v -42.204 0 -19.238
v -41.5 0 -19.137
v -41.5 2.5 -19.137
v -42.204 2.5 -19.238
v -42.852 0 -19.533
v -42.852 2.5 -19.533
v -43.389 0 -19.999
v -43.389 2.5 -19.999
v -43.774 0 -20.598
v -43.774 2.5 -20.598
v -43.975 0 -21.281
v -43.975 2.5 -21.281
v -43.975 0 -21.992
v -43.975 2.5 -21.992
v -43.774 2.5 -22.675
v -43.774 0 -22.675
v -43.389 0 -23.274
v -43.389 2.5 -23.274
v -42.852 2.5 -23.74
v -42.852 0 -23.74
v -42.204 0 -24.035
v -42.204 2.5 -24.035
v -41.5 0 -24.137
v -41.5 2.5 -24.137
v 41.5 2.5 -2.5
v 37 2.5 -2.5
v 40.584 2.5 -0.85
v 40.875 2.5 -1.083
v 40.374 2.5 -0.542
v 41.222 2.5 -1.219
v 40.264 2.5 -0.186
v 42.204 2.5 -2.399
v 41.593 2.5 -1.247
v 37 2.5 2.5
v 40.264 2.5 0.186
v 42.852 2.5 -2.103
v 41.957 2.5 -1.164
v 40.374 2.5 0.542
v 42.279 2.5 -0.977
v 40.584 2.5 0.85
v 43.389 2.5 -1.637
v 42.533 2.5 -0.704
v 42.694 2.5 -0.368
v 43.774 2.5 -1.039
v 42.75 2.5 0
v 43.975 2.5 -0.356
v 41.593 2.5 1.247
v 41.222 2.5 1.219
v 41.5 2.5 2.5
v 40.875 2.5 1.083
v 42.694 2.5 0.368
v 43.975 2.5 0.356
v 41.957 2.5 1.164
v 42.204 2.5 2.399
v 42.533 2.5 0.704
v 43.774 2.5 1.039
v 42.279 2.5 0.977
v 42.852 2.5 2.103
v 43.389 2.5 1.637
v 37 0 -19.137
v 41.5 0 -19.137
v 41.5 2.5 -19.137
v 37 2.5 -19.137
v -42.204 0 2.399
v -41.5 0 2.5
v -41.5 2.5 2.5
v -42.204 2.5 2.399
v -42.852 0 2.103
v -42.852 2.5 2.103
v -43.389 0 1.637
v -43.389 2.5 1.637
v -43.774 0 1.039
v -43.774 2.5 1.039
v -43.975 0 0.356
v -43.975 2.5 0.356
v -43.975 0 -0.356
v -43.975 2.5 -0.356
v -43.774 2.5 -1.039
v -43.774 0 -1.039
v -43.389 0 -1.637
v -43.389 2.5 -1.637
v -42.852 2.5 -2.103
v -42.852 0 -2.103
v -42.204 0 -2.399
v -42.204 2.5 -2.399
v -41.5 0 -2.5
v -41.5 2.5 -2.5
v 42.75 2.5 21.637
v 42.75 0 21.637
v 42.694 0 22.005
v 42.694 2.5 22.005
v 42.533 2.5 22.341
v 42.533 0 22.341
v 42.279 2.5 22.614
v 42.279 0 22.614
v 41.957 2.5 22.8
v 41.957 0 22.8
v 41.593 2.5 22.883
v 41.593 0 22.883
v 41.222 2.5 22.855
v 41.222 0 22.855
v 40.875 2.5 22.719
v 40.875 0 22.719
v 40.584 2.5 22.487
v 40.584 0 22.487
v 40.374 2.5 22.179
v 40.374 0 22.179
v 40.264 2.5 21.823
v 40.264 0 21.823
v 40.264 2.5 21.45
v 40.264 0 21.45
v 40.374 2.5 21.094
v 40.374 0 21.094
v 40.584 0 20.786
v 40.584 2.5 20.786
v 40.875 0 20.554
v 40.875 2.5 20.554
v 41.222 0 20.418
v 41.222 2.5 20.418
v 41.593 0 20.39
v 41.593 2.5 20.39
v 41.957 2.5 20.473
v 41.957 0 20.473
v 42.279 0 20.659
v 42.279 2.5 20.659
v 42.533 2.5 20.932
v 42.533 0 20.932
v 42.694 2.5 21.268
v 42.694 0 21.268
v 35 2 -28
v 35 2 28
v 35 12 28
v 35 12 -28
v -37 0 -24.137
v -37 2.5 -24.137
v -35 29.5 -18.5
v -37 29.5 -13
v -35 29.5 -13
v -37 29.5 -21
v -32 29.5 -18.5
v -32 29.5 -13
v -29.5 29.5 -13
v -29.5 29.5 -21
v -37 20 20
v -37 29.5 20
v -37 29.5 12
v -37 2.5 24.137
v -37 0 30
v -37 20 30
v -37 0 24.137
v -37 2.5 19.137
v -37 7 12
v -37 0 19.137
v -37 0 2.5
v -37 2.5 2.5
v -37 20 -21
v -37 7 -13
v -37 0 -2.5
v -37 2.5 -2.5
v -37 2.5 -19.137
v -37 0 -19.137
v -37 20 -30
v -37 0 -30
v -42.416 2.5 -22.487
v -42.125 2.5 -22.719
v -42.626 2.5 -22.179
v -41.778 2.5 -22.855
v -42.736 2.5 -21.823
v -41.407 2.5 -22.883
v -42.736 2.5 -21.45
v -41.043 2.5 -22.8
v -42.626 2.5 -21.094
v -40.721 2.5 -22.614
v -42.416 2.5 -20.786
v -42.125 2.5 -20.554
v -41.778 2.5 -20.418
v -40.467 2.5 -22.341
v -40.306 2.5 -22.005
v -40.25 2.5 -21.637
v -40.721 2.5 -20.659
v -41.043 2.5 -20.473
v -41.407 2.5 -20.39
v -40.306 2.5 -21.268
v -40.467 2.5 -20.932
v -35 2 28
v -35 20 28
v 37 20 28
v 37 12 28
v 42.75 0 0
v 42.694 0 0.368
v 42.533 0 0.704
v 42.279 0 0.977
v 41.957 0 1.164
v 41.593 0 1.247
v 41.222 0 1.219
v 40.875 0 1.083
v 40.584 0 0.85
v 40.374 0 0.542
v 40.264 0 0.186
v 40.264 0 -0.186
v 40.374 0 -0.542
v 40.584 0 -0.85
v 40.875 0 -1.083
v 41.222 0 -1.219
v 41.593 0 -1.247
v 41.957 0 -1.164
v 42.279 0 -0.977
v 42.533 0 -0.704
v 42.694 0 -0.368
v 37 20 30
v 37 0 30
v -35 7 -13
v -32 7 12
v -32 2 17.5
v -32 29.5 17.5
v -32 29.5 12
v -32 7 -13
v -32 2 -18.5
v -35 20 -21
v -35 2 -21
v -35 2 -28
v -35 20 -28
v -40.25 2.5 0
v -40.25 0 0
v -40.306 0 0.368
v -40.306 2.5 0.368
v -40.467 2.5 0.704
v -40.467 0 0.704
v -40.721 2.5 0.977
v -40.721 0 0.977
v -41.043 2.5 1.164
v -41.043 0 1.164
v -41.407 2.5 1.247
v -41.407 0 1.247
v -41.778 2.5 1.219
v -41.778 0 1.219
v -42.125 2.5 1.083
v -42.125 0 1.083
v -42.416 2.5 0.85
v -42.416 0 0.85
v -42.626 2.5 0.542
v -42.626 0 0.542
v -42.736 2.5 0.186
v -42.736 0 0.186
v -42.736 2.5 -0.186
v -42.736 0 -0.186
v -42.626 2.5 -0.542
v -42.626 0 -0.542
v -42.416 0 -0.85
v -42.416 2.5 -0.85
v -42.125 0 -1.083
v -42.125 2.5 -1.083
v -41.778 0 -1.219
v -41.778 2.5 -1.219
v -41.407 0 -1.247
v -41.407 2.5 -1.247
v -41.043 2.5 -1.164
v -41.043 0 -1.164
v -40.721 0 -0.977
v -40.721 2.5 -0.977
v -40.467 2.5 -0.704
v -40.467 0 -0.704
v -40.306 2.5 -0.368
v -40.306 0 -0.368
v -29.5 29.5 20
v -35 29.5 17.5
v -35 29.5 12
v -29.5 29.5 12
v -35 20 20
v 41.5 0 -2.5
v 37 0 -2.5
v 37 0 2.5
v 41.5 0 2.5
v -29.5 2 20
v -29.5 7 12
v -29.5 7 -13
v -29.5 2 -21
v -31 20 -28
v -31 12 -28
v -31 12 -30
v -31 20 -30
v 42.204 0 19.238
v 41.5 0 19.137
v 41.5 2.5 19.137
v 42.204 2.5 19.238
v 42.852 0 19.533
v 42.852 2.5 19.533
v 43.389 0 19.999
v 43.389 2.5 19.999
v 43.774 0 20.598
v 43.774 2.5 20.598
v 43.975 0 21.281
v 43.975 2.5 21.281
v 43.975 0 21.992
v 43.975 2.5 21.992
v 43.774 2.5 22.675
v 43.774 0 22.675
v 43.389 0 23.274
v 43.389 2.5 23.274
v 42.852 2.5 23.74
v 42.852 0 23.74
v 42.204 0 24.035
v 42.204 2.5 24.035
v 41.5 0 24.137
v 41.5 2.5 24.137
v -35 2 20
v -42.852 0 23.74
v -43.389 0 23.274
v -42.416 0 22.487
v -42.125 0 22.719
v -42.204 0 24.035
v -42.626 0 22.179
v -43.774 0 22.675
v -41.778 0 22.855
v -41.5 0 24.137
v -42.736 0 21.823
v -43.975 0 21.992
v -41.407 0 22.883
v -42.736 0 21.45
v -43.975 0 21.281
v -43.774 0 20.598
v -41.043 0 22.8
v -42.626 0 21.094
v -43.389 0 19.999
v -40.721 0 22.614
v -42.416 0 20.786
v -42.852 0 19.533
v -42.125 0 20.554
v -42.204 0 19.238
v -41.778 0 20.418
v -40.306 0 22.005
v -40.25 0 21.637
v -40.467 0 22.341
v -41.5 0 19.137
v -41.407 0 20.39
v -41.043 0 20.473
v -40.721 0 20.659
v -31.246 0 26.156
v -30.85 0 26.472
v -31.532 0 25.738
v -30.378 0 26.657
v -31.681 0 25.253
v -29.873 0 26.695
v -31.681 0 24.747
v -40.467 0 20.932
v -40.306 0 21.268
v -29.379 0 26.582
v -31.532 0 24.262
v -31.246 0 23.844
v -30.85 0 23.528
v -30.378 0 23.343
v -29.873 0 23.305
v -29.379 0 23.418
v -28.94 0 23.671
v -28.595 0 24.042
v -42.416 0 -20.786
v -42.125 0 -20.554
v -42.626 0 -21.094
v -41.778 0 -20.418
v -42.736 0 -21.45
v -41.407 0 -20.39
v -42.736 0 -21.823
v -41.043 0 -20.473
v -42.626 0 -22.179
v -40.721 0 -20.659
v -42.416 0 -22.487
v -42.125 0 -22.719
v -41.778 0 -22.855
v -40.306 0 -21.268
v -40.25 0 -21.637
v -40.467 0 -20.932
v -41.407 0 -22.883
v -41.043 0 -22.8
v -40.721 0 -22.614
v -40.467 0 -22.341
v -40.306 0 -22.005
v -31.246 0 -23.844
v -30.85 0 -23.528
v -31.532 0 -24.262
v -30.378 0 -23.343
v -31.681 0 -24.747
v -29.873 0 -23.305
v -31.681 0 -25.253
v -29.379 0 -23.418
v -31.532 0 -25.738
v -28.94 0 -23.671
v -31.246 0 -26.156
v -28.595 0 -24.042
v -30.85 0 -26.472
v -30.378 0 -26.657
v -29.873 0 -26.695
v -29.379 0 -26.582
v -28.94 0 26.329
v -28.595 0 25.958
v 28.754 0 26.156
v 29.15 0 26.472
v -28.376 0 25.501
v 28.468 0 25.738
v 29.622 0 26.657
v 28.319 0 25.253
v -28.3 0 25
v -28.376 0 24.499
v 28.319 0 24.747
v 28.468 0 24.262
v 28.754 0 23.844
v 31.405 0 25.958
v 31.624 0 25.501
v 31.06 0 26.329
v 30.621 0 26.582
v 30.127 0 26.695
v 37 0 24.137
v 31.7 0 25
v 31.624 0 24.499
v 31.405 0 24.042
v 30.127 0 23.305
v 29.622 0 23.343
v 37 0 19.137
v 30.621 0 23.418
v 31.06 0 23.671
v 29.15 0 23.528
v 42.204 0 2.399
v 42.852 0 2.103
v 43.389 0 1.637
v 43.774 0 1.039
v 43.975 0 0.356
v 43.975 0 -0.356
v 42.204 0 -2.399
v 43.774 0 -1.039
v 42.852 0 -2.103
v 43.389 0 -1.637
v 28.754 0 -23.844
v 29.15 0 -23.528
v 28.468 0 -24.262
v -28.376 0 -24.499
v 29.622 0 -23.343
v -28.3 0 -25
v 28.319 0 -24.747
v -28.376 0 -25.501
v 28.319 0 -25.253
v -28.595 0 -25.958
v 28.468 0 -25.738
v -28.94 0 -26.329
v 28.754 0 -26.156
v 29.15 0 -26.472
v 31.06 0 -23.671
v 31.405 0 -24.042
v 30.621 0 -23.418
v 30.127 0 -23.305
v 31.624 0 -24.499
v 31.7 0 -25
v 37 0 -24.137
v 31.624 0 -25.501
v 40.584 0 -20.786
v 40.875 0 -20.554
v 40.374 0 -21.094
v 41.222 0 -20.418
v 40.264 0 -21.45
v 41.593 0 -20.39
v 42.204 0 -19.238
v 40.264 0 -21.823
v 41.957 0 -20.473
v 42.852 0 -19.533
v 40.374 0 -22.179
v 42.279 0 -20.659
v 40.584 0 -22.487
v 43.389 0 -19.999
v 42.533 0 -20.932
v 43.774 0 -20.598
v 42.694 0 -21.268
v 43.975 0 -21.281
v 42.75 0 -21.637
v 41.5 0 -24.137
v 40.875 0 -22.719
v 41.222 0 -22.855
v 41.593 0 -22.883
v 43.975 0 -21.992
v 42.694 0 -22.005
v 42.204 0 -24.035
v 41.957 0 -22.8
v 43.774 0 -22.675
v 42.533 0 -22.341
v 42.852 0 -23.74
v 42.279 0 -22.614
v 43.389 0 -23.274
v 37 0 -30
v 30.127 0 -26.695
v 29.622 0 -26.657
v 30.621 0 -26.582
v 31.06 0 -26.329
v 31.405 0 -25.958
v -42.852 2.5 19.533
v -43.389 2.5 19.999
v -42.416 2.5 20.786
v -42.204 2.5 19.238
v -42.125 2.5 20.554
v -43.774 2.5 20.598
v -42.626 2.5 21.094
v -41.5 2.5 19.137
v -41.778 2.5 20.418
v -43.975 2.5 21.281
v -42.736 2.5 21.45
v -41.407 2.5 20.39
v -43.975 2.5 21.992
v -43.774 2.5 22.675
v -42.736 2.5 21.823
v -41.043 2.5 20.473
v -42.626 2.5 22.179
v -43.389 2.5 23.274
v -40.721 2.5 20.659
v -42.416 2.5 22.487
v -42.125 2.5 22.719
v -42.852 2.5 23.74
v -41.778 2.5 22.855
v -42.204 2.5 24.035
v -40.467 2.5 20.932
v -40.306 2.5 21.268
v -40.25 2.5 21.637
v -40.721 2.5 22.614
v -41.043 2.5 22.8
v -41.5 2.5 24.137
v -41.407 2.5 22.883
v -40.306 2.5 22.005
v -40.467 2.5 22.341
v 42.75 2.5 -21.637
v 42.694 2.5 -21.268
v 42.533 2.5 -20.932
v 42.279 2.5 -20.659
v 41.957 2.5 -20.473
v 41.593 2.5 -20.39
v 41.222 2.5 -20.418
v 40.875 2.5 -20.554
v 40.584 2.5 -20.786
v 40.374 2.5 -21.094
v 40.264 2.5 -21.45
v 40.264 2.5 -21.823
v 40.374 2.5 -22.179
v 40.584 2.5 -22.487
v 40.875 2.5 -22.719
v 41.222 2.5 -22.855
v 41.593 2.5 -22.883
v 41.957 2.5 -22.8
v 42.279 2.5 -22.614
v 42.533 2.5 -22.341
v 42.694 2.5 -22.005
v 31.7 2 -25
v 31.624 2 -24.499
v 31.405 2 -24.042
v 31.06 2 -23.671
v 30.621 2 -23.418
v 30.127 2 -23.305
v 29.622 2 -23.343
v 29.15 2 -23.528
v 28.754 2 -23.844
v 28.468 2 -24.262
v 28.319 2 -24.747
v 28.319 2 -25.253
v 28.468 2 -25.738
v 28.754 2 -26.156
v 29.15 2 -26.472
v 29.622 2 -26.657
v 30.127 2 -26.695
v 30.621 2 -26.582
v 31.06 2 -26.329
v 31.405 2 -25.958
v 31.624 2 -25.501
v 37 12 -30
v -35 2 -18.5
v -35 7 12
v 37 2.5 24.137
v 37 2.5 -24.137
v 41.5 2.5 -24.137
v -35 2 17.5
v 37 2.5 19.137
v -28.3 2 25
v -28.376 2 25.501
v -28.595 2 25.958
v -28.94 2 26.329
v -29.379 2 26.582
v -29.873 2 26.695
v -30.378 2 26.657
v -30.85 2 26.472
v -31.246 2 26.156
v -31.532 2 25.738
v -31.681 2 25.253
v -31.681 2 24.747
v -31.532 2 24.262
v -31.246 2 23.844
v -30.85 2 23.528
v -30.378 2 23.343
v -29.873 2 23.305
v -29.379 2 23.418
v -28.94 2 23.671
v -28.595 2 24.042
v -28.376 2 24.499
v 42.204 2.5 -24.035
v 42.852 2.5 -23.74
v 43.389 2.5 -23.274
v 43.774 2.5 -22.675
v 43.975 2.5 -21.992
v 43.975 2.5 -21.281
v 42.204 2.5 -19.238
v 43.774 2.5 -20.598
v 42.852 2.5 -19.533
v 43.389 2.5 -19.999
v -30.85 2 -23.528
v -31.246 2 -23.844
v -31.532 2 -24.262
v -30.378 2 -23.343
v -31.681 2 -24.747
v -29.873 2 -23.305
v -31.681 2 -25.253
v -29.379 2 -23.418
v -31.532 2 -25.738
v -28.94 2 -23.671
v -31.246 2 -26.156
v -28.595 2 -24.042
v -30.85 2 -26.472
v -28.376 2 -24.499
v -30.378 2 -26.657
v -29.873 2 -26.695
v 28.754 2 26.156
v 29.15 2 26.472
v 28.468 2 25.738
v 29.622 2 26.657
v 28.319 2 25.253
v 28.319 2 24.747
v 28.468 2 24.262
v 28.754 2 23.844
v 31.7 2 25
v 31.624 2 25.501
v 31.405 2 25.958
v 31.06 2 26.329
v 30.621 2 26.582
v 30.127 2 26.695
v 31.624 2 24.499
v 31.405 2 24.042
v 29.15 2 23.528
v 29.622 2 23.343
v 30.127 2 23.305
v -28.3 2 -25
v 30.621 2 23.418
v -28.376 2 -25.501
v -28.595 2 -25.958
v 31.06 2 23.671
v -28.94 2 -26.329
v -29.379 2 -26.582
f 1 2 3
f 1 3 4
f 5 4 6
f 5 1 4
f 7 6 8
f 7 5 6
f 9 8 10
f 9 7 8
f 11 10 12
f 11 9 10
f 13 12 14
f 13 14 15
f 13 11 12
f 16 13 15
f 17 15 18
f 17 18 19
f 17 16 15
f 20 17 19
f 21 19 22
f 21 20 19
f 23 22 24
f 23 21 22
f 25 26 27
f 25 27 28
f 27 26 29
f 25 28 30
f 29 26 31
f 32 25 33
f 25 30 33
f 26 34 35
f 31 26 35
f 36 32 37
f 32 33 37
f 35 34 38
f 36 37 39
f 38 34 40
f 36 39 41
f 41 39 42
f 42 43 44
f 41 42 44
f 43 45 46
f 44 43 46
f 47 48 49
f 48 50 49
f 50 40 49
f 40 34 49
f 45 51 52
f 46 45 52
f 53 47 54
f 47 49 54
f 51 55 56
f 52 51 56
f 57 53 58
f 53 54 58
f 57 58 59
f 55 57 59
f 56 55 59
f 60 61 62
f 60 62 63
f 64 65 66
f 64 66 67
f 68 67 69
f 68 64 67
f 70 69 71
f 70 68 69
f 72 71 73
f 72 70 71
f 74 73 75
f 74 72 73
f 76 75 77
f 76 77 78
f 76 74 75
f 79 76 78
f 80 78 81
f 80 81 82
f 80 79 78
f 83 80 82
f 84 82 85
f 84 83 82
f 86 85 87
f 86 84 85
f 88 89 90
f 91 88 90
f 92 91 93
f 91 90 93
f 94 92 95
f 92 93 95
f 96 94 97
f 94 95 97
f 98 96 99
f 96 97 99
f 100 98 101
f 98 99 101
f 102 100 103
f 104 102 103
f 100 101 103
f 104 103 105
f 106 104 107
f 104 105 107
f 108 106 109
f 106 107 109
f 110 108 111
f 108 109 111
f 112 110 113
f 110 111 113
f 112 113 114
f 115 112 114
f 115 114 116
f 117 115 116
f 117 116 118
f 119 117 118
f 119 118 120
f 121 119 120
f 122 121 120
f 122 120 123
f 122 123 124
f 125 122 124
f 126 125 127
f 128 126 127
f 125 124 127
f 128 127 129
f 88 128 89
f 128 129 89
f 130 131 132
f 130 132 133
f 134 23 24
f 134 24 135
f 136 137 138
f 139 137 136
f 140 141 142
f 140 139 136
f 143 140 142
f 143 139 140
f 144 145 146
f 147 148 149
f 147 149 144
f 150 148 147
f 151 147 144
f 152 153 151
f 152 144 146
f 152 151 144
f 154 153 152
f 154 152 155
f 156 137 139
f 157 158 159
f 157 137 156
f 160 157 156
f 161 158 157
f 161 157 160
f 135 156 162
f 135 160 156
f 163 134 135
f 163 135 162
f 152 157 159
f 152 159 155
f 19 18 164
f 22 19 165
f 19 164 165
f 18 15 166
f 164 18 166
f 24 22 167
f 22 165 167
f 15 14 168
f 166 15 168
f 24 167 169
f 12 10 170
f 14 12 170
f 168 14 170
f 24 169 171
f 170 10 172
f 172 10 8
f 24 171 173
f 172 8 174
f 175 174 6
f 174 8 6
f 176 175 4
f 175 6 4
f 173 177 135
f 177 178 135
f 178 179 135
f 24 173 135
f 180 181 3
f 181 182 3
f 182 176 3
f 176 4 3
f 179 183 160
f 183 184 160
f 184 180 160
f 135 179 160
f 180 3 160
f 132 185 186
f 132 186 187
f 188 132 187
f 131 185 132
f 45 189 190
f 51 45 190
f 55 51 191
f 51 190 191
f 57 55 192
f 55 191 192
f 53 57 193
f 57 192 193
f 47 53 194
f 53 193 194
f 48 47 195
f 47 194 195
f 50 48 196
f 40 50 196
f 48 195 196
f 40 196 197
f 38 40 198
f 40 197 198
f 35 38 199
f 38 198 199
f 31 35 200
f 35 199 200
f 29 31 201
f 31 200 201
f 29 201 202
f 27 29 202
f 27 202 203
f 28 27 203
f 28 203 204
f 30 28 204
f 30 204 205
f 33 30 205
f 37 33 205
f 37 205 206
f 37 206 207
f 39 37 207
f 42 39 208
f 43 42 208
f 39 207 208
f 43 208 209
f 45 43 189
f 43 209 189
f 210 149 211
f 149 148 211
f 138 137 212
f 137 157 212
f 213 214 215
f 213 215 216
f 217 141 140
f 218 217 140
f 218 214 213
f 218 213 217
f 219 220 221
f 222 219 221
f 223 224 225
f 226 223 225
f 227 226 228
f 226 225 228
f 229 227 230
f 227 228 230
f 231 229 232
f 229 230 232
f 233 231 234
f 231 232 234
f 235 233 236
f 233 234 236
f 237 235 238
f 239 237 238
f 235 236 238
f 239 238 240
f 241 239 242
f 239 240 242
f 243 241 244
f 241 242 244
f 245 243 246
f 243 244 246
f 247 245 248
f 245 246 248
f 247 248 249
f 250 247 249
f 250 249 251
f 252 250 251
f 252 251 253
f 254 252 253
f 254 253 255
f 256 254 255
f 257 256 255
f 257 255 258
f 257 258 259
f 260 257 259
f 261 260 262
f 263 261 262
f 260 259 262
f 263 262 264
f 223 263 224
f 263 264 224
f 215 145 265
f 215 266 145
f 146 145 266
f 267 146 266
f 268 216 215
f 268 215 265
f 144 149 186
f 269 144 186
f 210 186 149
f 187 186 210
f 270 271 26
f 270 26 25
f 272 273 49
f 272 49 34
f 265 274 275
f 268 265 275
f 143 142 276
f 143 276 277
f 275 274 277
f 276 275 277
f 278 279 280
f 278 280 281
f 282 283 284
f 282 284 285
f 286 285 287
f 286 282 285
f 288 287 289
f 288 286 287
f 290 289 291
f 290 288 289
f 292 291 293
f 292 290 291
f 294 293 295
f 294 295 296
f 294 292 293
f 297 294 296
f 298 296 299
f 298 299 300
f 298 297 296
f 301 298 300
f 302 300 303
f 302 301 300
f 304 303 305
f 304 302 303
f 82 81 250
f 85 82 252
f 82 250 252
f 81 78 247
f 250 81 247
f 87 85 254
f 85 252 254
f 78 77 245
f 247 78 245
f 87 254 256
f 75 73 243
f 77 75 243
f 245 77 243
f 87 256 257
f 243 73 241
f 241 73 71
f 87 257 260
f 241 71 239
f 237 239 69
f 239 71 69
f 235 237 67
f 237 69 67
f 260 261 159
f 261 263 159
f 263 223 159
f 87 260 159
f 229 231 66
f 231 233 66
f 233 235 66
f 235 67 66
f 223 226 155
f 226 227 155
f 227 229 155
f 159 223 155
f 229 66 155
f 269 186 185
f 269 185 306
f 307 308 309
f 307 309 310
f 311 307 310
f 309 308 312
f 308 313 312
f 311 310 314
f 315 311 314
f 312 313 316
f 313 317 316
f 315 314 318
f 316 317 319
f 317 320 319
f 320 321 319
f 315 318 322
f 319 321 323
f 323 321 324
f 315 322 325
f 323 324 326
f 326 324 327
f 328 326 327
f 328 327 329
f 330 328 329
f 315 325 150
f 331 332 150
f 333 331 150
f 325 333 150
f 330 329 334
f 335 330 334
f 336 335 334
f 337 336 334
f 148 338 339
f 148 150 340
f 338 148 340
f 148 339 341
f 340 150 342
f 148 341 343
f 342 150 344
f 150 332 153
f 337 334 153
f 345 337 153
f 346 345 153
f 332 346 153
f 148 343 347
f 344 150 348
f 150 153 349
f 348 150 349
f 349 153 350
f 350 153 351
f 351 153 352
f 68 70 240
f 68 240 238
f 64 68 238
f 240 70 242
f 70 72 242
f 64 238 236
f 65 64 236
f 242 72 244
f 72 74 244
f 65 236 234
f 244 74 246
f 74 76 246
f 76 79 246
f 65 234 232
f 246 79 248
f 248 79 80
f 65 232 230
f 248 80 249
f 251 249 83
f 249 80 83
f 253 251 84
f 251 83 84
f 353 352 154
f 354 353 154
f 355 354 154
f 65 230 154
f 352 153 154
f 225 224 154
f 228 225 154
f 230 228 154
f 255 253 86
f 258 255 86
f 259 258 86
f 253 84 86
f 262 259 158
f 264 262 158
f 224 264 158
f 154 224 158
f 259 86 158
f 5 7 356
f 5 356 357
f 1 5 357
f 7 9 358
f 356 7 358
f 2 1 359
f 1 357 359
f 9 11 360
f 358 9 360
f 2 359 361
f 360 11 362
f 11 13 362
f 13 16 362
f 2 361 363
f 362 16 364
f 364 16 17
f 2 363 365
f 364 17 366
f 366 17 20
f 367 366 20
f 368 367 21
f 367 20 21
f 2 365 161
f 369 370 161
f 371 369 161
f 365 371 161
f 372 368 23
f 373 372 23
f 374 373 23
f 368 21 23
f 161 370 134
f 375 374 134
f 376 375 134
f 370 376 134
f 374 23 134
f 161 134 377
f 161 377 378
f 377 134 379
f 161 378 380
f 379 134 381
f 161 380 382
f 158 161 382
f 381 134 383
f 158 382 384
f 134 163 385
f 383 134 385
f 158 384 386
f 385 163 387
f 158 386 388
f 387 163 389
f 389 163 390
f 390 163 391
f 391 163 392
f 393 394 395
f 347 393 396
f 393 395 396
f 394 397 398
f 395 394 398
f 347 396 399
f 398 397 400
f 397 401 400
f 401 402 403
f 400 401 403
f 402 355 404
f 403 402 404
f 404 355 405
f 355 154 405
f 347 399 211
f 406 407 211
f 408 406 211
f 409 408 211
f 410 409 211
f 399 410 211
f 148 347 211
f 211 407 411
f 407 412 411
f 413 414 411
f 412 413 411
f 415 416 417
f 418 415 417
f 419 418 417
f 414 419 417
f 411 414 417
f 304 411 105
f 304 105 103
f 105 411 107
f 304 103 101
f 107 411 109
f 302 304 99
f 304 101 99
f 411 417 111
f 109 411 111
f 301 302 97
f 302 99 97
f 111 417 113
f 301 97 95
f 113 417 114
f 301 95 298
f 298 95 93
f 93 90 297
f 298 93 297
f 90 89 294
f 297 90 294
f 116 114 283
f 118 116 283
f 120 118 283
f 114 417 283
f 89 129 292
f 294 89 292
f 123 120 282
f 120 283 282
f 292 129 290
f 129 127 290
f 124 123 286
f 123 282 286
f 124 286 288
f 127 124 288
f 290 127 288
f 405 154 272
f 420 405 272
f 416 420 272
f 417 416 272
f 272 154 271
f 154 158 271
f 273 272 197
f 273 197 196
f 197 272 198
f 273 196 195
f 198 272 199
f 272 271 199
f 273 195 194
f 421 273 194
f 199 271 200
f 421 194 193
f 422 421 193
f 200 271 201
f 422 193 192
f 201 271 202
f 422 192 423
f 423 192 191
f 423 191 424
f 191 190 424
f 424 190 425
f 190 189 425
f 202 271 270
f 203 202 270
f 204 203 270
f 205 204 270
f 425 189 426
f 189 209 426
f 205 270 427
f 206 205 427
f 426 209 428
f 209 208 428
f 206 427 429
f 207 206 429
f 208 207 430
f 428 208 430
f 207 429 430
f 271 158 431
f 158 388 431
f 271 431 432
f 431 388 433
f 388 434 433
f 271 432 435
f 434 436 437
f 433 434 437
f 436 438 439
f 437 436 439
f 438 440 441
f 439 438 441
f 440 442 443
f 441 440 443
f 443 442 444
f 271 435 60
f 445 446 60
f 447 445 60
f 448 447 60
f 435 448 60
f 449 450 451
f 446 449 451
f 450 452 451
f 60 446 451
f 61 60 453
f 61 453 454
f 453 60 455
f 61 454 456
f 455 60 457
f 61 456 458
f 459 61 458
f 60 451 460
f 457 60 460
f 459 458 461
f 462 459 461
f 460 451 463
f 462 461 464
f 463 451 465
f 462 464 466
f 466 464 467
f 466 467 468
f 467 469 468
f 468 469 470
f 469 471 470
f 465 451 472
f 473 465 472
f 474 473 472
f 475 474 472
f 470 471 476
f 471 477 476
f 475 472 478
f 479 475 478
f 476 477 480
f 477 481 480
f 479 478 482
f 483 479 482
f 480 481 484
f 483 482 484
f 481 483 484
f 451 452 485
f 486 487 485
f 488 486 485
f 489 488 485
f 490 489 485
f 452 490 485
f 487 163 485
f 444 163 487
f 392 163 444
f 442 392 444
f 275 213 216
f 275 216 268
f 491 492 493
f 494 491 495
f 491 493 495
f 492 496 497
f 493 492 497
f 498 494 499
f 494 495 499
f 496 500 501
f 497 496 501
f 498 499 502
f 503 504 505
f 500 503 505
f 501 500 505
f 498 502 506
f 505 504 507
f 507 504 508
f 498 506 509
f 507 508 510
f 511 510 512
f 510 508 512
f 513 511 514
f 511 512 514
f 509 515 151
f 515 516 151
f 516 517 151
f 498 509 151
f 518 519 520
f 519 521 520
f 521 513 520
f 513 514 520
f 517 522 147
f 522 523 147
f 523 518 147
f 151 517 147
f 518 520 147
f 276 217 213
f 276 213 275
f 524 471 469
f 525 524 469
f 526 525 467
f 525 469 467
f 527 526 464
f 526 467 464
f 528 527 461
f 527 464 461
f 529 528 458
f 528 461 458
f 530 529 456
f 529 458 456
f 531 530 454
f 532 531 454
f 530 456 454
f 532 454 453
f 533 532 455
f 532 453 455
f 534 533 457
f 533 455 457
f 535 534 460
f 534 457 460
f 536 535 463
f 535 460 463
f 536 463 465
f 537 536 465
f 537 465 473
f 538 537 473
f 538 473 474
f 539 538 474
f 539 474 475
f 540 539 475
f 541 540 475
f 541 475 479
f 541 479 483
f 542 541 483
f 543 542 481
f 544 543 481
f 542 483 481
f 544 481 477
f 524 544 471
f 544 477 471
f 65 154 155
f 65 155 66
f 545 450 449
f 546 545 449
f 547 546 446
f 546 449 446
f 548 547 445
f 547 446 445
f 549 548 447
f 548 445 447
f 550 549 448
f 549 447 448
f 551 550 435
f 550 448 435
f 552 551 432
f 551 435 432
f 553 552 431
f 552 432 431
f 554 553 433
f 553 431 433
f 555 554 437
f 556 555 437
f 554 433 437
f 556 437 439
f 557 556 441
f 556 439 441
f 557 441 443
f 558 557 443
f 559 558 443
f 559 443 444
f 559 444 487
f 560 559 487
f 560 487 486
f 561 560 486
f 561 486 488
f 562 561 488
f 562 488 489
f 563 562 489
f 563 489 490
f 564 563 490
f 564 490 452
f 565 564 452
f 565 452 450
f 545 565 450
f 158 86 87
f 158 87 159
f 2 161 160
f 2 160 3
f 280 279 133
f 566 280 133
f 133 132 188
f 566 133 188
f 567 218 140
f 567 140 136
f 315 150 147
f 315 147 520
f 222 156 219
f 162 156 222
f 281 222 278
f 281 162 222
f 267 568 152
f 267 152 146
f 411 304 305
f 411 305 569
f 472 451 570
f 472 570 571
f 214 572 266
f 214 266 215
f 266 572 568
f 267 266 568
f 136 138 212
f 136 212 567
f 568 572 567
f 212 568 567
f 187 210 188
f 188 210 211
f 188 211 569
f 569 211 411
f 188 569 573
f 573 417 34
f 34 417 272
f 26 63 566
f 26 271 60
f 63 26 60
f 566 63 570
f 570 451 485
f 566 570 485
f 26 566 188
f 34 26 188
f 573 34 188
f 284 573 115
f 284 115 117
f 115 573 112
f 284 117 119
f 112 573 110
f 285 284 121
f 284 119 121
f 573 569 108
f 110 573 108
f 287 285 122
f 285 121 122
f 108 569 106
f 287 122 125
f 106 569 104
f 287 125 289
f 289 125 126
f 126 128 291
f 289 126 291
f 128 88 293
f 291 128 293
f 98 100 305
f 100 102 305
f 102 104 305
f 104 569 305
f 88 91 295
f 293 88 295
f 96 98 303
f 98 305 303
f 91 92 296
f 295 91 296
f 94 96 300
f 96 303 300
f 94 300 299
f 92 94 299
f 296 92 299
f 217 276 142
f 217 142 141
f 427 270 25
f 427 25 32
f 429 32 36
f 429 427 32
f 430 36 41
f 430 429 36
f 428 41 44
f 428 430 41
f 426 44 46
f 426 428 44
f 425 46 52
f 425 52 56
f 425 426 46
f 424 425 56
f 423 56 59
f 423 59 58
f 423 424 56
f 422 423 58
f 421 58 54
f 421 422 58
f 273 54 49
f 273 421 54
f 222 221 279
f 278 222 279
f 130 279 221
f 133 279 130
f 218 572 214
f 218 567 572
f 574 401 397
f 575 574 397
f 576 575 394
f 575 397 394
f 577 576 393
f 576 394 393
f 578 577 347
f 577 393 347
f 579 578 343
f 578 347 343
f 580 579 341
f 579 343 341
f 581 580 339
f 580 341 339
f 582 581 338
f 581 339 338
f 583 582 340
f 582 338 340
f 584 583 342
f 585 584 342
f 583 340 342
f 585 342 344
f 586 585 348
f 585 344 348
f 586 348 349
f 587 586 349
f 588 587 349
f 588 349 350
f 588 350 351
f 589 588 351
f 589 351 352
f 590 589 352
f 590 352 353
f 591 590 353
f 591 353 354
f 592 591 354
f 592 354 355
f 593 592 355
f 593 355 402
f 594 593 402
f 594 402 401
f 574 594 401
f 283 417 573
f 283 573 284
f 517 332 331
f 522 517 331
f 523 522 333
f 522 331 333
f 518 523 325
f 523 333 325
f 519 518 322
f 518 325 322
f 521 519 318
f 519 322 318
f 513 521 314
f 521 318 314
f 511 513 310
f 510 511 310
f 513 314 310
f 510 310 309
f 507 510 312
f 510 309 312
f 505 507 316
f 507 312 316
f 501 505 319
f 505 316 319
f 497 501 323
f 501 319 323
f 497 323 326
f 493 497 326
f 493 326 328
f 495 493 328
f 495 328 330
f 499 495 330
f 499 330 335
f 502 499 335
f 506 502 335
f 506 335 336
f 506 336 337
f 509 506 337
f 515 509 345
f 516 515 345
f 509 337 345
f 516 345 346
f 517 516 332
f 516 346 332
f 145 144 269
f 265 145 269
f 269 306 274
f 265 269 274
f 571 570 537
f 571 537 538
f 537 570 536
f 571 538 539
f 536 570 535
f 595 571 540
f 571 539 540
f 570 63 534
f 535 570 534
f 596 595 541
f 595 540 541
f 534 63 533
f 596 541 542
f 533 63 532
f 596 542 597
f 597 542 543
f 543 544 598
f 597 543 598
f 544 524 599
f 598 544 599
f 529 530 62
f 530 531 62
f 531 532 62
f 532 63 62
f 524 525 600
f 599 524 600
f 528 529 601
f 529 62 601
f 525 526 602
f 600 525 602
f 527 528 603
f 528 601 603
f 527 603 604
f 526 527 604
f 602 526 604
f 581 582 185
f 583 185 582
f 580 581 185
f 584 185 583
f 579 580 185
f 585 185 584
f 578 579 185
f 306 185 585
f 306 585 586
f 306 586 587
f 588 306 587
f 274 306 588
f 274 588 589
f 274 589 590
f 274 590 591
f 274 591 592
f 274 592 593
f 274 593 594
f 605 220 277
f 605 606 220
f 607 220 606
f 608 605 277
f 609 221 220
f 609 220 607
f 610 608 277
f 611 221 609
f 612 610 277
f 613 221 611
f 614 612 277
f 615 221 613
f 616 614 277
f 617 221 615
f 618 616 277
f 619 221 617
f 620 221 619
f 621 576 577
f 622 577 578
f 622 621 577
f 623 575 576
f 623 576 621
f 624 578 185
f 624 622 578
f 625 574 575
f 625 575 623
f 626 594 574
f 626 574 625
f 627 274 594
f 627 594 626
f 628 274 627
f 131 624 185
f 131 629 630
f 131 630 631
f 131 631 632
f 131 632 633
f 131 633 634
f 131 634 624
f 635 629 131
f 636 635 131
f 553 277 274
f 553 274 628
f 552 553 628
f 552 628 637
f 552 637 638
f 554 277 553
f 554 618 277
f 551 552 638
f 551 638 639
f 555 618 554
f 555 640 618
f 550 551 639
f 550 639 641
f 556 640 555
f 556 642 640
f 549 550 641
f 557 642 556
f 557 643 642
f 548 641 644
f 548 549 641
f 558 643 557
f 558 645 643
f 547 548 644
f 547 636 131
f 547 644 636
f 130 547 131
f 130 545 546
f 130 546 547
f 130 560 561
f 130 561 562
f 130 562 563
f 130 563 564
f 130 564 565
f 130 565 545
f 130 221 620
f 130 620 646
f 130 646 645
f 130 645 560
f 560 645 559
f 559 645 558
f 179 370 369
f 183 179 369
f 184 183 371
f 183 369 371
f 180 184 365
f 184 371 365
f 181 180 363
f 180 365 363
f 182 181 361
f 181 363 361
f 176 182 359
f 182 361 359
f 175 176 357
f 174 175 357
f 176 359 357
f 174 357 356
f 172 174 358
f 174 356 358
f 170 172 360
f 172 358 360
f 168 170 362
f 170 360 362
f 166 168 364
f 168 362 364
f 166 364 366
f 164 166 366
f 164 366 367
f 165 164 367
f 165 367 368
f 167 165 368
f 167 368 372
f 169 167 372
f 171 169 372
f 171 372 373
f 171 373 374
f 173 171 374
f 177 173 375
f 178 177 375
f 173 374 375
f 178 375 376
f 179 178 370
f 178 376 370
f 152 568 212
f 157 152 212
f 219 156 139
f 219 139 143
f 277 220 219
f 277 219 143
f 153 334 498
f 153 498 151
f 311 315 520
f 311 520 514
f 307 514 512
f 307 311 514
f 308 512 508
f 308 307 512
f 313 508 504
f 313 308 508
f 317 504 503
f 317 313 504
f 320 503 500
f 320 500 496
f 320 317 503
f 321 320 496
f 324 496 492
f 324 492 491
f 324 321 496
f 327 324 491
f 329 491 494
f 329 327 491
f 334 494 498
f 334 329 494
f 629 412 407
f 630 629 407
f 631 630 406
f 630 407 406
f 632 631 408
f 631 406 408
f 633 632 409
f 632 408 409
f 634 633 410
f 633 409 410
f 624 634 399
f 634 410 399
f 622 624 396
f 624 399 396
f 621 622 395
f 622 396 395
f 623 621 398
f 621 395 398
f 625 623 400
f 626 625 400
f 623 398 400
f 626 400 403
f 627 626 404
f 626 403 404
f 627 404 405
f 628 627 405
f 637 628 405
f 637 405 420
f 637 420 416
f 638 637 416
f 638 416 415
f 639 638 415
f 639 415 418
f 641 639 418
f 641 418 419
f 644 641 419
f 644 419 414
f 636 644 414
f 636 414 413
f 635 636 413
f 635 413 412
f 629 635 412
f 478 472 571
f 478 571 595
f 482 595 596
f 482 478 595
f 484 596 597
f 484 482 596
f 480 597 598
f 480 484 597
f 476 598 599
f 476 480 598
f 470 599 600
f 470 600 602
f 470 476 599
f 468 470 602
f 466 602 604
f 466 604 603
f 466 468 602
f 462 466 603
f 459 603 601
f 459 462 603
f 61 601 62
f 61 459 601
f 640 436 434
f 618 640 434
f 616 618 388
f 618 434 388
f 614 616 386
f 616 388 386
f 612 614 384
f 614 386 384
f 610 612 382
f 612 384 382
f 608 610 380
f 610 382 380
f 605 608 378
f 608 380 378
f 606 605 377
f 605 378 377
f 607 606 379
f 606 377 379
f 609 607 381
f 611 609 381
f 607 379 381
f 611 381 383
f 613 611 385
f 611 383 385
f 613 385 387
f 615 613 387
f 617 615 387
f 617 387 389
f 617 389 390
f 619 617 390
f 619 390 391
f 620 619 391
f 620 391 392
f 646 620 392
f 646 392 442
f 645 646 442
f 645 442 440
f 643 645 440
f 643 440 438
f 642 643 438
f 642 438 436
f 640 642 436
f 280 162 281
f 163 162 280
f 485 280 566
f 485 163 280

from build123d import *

# Parameters (mm, degrees)
SCHIZZO1_W                    = 74
SCHIZZO1_H                    = 60
ESTRUSIONE_ESTRUSIONE1_DEPTH  = 2
SCHIZZO2_W                    = 74
SCHIZZO2_H                    = 60
SCHIZZO2_W_2                  = 70
SCHIZZO2_H_2                  = 56
ESTRUSIONE_ESTRUSIONE2_DEPTH  = 18
SCHIZZO3_R                    = 1.7
TAGLIO_ESTRUSIONE1_DEPTH      = 8
SCHIZZO4_W                    = 68
SCHIZZO4_H                    = 8
TAGLIO_ESTRUSIONE2_DEPTH      = 56
TAGLIO_ESTRUSIONE2_DEPTH_BACK = 17
ESTRUSIONE_ESTRUSIONE3_DEPTH  = 27.5
SCHIZZO6_W                    = 2.5
SCHIZZO6_H                    = 25
ESTRUSIONE_ESTRUSIONE4_DEPTH  = 5
SCHIZZO7_W                    = 25
SCHIZZO7_H                    = 13
TAGLIO_ESTRUSIONE3_DEPTH      = 5
SCHIZZO8_W                    = 2
SCHIZZO8_H                    = 8
ESTRUSIONE_ESTRUSIONE5_DEPTH  = 9.5
SCHIZZO9_R                    = 1.25
ESTRUSIONE_ESTRUSIONE6_DEPTH  = 2.5


with BuildPart() as part:
    # Schizzo1 → Estrusione-Estrusione1 (new body)
    with BuildSketch(Plane(origin=(0, 0, 0), x_dir=(1, 0, 0), z_dir=(0, 1, 0))):
        Rectangle(SCHIZZO1_W, SCHIZZO1_H)
    extrude(amount=ESTRUSIONE_ESTRUSIONE1_DEPTH)

    # Schizzo2 → Estrusione-Estrusione2 (add)
    with BuildSketch(Plane(origin=(0, 2, 0), x_dir=(1, 0, 0), z_dir=(0, 1, 0))):
        Rectangle(SCHIZZO2_W, SCHIZZO2_H)
        Rectangle(SCHIZZO2_W_2, SCHIZZO2_H_2, mode=Mode.SUBTRACT)
    extrude(amount=ESTRUSIONE_ESTRUSIONE2_DEPTH)

    # Schizzo3 → Taglio-Estrusione1 (cut)
    with BuildSketch(Plane.XZ):
        with Locations((-30, 25)):
            Circle(SCHIZZO3_R)
        with Locations((30, 25)):
            Circle(SCHIZZO3_R)
        with Locations((30, -25)):
            Circle(SCHIZZO3_R)
        with Locations((-30, -25)):
            Circle(SCHIZZO3_R)
    extrude(amount=-TAGLIO_ESTRUSIONE1_DEPTH, mode=Mode.SUBTRACT)

    # Schizzo4 → Taglio-Estrusione2 (cut, two sides)
    with BuildSketch(Plane.XY.offset(-28)) as taglio_estrusione2_sk:
        with Locations((3, 16)):
            Rectangle(SCHIZZO4_W, SCHIZZO4_H)
    extrude(amount=TAGLIO_ESTRUSIONE2_DEPTH, mode=Mode.SUBTRACT)
    extrude(taglio_estrusione2_sk.sketch, amount=-TAGLIO_ESTRUSIONE2_DEPTH_BACK, mode=Mode.SUBTRACT)

    # Schizzo5 → Estrusione-Estrusione3 (add)
    with BuildSketch(Plane(origin=(0, 2, 0), x_dir=(1, 0, 0), z_dir=(0, 1, 0))):
        Polygon((-35, 21), (-29.5, 21), (-29.5, 15.569709151), (-29.5, 13), (-32, 13), (-32, 18.5), (-35, 18.5), align=None)
        Polygon((-29.5, -12), (-29.5, -6.768227203), (-29.5, -20), (-35, -20), (-35, -17.5), (-32, -17.5), (-32, -12), align=None)
    extrude(amount=ESTRUSIONE_ESTRUSIONE3_DEPTH)

    # Schizzo6 → Estrusione-Estrusione4 (add)
    with BuildSketch(Plane(origin=(0, 2, 0), x_dir=(1, 0, 0), z_dir=(0, 1, 0))):
        with Locations((-30.75, 0.5)):
            Rectangle(SCHIZZO6_W, SCHIZZO6_H)
    extrude(amount=ESTRUSIONE_ESTRUSIONE4_DEPTH)

    # Schizzo7 → Taglio-Estrusione3 (cut)
    with BuildSketch(Plane(origin=(-35, 0, 0), x_dir=(0, 0, -1), z_dir=(1, 0, 0))):
        with Locations((0.5, 13.5)):
            Rectangle(SCHIZZO7_W, SCHIZZO7_H)
    extrude(amount=-TAGLIO_ESTRUSIONE3_DEPTH, mode=Mode.SUBTRACT)

    # Schizzo8 → Estrusione-Estrusione5 (add)
    with BuildSketch(Plane(origin=(0, 20, 0), x_dir=(1, 0, 0), z_dir=(0, 1, 0))):
        with Locations((-36, 17)):
            Rectangle(SCHIZZO8_W, SCHIZZO8_H)
        with Locations((-36, -16)):
            Rectangle(SCHIZZO8_W, SCHIZZO8_H)
    extrude(amount=ESTRUSIONE_ESTRUSIONE5_DEPTH)

    # Schizzo9 → Estrusione-Estrusione6 (add)
    with BuildSketch(Plane.XZ):
        with BuildLine():
            Line((-37, -24.136555447), (-37, -19.136555447))
            Line((-37, -19.136555447), (-41.5, -19.136555447))
            ThreePointArc((-41.5, -19.136555447), (-44, -21.636555447), (-41.5, -24.136555447))
            Line((-41.5, -24.136555447), (-37, -24.136555447))
        make_face()
        with Locations((-41.5, -21.636555447)):
            Circle(SCHIZZO9_R, mode=Mode.SUBTRACT)
        with BuildLine():
            Line((-37, -2.5), (-37, 2.5))
            Line((-37, 2.5), (-41.5, 2.5))
            ThreePointArc((-41.5, 2.5), (-44, 0), (-41.5, -2.5))
            Line((-41.5, -2.5), (-37, -2.5))
        make_face()
        with Locations((-41.5, 0)):
            Circle(SCHIZZO9_R, mode=Mode.SUBTRACT)
        with BuildLine():
            Line((-37, 19.136555447), (-37, 24.136555447))
            Line((-37, 24.136555447), (-41.5, 24.136555447))
            ThreePointArc((-41.5, 24.136555447), (-44, 21.636555447), (-41.5, 19.136555447))
            Line((-41.5, 19.136555447), (-37, 19.136555447))
        make_face()
        with Locations((-41.5, 21.636555447)):
            Circle(SCHIZZO9_R, mode=Mode.SUBTRACT)
        with BuildLine():
            Line((37, 24.136555447), (37, 19.136555447))
            Line((37, 19.136555447), (41.5, 19.136555447))
            ThreePointArc((41.5, 19.136555447), (44, 21.636555447), (41.5, 24.136555447))
            Line((41.5, 24.136555447), (37, 24.136555447))
        make_face()
        with Locations((41.5, 21.636555447)):
            Circle(SCHIZZO9_R, mode=Mode.SUBTRACT)
        with BuildLine():
            Line((37, 2.5), (37, -2.5))
            Line((37, -2.5), (41.5, -2.5))
            ThreePointArc((41.5, -2.5), (44, 0), (41.5, 2.5))
            Line((41.5, 2.5), (37, 2.5))
        make_face()
        with Locations((41.5, 0)):
            Circle(SCHIZZO9_R, mode=Mode.SUBTRACT)
        with BuildLine():
            Line((37, -19.136555447), (37, -24.136555447))
            Line((37, -24.136555447), (41.5, -24.136555447))
            ThreePointArc((41.5, -24.136555447), (44, -21.636555447), (41.5, -19.136555447))
            Line((41.5, -19.136555447), (37, -19.136555447))
        make_face()
        with Locations((41.5, -21.636555447)):
            Circle(SCHIZZO9_R, mode=Mode.SUBTRACT)
    extrude(amount=-ESTRUSIONE_ESTRUSIONE6_DEPTH)


solid = part.part
